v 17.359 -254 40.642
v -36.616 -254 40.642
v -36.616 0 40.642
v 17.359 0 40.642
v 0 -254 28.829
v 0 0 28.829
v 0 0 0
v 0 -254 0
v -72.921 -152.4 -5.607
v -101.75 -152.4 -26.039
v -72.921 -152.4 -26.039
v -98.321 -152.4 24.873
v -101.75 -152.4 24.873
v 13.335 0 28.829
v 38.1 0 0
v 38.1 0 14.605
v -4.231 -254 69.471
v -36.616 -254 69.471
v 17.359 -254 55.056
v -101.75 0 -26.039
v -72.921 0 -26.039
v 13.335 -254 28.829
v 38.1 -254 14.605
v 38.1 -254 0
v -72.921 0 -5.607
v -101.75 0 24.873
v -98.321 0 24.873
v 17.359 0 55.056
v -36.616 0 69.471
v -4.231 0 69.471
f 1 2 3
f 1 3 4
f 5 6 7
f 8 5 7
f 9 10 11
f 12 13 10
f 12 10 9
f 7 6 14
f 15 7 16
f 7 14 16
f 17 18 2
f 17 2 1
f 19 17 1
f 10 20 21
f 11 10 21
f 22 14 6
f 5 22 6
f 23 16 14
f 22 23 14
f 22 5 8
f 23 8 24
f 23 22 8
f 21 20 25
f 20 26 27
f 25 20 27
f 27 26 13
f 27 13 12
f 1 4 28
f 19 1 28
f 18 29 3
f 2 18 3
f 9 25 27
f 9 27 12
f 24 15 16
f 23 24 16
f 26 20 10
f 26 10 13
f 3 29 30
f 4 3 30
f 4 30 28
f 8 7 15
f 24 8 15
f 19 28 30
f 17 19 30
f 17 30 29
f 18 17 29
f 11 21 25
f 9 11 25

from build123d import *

# Parameters (mm, degrees)
F1_DEPTH = 254
F3_DEPTH = 254
F4_W     = 28.829
F4_H     = 50.9118726689
F5_DEPTH = 152.4
F6_SIZE2 = 30.48
F6_SIZE  = 25.4


with BuildPart() as f1:
    # F0 (on Front) → F1 (new body)
    with BuildSketch(Plane.XZ):
        Polygon((0, 28.829), (0, 0), (38.1, 0), (38.1, 14.605), (13.335, 28.829), align=None)
    extrude(amount=F1_DEPTH)


with BuildPart() as f3:
    # F2 (on Front) → F3 (new body)
    with BuildSketch(Plane.XZ):
        Polygon((-4.2308812982, 69.4709341247), (-36.6158812982, 69.4709341247), (-36.6158812982, 40.6419341247), (17.3591187018, 40.6419341247), (17.3591187018, 55.0564341247), align=None)
    extrude(amount=F3_DEPTH)


with BuildPart() as f5:
    # F4 (on Front) → F5 (new body)
    with BuildSketch(Plane.XZ):
        with Locations((-87.3358398676, -0.5832361057)):
            Rectangle(F4_W, F4_H)
    extrude(amount=F5_DEPTH)

    # F6
    f6_edges = [f5.edges().sort_by_distance(p)[0] for p in [
        (-72.92134, -76.2, 24.8727),
    ]]
    f6_side = f5.faces().sort_by_distance((-87.33584, -76.2, 24.8727))[0]
    chamfer(f6_edges, length=F6_SIZE, length2=F6_SIZE2, reference=f6_side)


solid = Compound([f1.part, f3.part, f5.part])
